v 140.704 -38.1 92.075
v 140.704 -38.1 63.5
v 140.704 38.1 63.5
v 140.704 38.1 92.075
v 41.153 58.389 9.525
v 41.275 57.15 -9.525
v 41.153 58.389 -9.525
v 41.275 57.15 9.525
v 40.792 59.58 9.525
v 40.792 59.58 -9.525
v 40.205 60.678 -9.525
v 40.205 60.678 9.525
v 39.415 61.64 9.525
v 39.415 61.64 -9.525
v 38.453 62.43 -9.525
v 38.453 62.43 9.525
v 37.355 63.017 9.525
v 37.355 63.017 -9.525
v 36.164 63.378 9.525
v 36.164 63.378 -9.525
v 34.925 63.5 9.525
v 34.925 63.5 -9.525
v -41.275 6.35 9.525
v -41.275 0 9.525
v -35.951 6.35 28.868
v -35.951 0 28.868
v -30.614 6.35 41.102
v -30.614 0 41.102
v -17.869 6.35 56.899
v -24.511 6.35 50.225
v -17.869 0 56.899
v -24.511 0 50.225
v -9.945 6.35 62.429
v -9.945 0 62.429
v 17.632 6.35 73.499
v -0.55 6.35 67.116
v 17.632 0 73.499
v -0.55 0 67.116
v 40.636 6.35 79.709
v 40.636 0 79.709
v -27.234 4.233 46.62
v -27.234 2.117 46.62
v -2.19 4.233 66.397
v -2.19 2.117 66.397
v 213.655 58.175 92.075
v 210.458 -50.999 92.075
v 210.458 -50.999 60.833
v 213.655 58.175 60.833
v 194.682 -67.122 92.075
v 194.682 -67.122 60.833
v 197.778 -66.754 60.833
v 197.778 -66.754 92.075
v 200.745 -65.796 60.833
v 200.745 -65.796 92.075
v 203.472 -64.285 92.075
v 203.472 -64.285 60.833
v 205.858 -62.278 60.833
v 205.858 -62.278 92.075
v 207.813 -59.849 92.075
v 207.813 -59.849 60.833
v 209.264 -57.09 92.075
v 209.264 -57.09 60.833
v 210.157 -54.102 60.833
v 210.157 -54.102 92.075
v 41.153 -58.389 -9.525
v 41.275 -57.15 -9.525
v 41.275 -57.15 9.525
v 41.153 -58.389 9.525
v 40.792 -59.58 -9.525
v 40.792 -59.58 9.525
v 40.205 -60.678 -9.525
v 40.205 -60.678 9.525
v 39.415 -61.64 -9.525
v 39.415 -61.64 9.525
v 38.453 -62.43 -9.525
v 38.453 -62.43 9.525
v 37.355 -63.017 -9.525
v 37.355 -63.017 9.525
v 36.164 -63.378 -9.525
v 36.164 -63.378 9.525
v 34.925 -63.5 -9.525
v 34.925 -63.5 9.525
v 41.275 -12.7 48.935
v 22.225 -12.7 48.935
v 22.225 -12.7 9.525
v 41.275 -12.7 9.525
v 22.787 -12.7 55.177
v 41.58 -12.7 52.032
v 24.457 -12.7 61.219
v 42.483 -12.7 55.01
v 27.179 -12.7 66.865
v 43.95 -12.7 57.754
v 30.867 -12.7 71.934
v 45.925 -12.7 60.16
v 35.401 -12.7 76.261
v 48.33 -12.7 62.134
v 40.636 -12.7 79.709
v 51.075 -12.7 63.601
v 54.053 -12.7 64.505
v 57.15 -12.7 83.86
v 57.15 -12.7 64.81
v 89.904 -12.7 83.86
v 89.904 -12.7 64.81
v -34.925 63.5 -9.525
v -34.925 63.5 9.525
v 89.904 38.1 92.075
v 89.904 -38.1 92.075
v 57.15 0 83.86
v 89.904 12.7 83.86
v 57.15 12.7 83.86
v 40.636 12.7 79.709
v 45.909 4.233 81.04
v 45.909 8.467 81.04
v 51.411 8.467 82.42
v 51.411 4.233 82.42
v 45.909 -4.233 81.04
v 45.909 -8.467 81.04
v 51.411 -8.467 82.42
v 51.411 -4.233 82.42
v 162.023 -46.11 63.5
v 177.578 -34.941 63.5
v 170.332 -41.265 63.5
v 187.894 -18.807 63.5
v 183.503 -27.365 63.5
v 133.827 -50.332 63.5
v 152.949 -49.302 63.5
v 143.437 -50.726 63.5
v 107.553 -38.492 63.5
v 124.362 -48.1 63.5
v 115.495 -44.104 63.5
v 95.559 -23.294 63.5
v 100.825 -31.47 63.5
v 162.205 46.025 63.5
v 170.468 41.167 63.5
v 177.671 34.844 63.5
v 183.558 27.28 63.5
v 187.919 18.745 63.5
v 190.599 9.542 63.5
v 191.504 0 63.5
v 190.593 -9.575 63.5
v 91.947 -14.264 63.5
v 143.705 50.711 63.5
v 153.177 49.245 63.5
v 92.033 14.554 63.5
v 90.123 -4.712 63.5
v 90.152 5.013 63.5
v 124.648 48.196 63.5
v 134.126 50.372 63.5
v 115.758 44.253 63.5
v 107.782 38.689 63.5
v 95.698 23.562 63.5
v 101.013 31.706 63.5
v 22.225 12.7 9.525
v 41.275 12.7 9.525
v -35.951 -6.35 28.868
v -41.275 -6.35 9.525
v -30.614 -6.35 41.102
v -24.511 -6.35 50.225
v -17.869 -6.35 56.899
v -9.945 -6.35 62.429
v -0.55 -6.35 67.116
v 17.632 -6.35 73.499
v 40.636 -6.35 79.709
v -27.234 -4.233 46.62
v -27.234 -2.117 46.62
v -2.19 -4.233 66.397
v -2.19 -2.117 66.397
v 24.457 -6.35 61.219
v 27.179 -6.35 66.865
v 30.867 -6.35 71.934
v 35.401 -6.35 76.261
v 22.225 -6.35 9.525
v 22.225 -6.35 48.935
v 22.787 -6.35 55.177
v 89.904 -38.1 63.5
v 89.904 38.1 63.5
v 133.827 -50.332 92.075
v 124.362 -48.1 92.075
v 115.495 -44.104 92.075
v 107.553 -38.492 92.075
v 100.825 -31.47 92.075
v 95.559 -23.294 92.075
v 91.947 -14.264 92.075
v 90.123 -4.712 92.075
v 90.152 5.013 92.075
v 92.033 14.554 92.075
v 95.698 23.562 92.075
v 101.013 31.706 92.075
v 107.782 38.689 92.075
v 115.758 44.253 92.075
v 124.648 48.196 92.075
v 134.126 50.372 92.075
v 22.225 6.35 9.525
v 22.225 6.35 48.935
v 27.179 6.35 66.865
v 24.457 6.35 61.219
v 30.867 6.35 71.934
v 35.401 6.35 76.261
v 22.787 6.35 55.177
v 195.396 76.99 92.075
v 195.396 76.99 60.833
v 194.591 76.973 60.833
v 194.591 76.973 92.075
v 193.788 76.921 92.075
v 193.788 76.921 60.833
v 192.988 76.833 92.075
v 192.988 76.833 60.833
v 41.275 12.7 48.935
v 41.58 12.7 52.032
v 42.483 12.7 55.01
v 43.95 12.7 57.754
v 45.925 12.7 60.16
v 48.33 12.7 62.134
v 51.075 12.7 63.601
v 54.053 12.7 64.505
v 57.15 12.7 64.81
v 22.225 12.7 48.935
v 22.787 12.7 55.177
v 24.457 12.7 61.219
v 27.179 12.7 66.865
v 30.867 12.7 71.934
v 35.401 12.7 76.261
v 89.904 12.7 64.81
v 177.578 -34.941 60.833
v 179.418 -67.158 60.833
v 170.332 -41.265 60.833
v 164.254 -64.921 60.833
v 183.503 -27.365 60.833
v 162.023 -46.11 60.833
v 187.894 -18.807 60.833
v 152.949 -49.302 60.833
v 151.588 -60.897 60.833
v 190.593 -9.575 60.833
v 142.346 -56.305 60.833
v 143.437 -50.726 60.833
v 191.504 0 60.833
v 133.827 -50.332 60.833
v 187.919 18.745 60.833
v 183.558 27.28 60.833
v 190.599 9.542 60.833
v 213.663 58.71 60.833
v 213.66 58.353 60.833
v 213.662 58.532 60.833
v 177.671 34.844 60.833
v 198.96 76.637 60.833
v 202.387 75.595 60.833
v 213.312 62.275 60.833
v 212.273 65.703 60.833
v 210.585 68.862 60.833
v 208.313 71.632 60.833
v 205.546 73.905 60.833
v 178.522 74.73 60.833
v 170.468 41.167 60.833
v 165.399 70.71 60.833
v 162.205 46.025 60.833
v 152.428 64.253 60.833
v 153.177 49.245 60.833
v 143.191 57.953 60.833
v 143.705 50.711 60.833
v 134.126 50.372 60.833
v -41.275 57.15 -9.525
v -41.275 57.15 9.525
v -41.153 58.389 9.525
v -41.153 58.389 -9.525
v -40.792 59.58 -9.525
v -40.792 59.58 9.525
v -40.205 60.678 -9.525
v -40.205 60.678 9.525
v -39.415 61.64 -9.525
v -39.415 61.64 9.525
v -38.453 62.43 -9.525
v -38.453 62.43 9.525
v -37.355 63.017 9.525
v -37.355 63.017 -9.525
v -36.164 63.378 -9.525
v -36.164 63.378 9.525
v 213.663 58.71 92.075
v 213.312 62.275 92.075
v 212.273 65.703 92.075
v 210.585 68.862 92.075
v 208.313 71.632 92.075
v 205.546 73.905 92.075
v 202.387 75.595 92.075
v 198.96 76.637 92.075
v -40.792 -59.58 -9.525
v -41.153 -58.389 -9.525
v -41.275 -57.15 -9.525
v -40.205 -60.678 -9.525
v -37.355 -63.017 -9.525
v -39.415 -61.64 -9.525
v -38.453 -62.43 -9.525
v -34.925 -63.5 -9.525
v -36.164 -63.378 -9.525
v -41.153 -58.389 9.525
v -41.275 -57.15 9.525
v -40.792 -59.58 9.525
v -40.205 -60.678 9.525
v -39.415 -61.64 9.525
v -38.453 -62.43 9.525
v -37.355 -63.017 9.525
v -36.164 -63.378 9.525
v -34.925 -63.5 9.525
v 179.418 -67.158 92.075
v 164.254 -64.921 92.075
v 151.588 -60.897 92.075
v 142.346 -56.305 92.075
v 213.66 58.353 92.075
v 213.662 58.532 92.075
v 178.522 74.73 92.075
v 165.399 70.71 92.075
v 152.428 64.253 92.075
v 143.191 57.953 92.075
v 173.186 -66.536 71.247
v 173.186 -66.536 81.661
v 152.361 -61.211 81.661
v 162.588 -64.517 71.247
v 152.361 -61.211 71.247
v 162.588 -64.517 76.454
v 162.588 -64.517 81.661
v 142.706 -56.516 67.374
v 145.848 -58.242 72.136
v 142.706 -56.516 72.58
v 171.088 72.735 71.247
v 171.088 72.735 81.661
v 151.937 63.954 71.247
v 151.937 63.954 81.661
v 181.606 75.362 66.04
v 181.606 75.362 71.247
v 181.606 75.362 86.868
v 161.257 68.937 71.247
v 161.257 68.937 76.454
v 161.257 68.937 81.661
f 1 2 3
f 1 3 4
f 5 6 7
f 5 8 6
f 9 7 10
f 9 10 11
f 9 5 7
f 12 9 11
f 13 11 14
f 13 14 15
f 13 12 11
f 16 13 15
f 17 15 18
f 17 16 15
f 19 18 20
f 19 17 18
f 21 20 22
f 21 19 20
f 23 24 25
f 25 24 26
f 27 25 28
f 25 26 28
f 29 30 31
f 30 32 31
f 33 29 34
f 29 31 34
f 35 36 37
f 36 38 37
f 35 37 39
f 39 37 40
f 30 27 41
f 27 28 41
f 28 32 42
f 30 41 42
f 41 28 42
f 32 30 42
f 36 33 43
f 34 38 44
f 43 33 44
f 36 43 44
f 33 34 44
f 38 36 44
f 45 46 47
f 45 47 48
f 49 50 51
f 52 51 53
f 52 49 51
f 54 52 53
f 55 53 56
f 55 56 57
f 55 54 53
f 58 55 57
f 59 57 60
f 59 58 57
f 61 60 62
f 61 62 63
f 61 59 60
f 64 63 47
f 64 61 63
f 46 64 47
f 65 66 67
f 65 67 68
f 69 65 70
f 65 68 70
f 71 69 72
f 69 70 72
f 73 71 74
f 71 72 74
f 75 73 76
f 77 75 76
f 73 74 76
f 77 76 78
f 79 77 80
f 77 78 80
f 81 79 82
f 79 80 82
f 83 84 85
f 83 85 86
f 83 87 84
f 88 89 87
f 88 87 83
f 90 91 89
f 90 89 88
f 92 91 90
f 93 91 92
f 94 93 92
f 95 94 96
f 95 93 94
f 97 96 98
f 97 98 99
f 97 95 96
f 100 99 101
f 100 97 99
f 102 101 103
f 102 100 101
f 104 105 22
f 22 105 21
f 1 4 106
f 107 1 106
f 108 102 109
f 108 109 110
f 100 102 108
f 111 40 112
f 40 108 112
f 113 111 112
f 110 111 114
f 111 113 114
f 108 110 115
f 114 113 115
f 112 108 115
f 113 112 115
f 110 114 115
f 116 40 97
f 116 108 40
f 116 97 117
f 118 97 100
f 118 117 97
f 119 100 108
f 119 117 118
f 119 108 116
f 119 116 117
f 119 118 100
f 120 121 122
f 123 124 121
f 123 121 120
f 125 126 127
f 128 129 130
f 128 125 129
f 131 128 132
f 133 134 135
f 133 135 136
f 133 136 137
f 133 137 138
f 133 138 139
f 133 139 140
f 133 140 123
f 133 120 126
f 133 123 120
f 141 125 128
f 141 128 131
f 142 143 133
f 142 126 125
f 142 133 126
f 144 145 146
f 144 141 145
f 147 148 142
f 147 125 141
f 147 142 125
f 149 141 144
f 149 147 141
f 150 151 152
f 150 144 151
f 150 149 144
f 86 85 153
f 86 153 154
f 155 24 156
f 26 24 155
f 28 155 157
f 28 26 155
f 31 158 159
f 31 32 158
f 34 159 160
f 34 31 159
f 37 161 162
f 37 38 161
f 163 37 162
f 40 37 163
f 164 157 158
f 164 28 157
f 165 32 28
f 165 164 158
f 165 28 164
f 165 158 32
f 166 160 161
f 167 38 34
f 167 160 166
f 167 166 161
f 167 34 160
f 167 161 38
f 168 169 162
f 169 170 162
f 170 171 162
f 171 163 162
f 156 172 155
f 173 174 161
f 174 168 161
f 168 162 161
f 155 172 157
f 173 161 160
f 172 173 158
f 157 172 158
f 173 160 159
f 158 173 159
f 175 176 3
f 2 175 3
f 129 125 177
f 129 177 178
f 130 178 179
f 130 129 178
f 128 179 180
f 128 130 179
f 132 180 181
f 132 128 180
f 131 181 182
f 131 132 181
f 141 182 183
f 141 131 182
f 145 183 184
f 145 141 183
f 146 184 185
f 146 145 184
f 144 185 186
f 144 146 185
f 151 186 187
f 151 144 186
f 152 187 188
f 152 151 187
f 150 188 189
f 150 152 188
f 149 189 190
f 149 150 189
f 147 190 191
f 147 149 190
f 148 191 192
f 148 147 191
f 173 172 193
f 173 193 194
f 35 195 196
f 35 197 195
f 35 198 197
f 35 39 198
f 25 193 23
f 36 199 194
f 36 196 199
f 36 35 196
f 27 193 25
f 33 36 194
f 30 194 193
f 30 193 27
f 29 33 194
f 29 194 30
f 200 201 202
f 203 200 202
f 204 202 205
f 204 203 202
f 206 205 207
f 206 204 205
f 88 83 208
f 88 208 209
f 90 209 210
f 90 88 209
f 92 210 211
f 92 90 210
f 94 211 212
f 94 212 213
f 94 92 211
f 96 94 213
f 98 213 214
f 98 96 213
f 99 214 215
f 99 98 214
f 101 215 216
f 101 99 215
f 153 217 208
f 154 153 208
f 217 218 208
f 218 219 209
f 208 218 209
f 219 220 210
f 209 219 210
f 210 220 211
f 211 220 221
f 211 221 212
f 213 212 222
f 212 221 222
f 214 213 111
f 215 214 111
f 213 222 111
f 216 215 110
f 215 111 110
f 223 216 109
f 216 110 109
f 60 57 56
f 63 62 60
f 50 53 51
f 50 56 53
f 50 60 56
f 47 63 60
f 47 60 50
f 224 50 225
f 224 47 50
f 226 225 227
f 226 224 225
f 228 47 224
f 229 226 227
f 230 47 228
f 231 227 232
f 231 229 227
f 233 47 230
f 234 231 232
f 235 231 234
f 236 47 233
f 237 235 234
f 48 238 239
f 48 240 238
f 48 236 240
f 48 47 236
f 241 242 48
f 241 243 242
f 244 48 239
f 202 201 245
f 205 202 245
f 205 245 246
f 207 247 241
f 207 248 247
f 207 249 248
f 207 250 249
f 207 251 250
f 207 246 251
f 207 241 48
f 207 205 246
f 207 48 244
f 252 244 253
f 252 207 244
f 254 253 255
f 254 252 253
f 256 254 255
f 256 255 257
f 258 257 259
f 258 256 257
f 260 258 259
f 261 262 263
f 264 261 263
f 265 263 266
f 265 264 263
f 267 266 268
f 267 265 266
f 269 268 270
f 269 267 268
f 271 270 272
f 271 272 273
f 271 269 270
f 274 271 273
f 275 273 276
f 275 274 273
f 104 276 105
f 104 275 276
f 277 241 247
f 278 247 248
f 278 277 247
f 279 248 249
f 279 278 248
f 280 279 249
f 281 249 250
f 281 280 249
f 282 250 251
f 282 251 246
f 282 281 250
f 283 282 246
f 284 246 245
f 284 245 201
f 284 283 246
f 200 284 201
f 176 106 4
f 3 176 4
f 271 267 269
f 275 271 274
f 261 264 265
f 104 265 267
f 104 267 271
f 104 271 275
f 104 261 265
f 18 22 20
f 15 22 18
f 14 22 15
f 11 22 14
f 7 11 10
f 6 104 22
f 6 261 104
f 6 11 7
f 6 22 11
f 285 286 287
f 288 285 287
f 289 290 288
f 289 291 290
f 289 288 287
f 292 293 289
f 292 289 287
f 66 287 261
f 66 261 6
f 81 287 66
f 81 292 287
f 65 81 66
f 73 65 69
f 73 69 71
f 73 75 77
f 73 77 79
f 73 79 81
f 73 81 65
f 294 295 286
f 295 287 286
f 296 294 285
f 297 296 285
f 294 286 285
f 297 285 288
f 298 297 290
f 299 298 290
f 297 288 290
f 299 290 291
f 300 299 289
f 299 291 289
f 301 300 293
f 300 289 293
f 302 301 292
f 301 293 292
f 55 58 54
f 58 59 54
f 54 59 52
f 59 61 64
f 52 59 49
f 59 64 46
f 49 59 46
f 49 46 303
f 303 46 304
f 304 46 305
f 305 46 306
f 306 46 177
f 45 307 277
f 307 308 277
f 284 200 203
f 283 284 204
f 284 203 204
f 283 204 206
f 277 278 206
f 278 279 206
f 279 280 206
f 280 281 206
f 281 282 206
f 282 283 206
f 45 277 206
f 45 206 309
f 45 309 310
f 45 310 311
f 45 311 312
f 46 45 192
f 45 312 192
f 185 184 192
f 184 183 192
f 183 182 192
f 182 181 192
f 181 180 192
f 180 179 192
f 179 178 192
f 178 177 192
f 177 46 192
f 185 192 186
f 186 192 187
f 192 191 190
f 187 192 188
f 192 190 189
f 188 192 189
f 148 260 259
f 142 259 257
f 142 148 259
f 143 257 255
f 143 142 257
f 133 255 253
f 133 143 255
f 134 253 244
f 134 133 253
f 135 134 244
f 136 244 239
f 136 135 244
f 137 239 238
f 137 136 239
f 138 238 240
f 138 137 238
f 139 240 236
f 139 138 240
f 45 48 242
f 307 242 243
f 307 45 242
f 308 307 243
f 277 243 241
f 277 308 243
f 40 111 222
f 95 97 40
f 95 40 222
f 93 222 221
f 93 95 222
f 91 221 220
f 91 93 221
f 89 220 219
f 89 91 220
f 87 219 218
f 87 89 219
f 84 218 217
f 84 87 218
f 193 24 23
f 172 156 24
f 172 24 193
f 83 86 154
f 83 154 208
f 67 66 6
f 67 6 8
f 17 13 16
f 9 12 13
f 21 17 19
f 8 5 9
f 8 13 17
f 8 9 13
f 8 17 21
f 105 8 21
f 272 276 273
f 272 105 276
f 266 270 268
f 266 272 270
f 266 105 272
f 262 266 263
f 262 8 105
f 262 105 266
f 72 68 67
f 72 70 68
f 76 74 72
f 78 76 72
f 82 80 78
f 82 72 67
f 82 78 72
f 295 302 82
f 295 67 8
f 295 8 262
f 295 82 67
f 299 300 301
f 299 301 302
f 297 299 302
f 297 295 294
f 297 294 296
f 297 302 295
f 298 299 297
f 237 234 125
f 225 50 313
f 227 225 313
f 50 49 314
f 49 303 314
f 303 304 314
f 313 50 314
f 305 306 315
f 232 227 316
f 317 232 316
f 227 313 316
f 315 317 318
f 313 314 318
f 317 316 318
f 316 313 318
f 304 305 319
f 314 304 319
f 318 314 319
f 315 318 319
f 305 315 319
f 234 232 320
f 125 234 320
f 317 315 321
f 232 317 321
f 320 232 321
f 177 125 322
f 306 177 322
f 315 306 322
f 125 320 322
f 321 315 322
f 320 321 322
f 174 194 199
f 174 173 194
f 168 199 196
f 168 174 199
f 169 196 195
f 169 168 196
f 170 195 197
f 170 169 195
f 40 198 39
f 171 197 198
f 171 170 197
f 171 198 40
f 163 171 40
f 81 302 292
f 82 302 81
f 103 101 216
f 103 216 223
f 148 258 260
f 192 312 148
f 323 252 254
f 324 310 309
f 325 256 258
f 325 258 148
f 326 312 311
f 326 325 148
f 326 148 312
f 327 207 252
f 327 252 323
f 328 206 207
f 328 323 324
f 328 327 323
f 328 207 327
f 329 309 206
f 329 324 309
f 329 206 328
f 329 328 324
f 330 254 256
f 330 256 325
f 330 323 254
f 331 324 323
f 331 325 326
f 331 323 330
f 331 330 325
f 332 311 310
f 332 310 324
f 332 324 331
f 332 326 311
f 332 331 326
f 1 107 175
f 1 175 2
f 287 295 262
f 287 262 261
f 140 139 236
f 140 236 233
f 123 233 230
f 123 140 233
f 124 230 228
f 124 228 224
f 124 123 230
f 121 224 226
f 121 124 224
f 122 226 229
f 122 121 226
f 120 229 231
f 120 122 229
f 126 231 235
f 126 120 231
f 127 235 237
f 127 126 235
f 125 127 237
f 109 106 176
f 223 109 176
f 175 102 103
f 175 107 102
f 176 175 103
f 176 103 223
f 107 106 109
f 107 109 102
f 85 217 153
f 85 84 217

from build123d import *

# Parameters (mm, degrees)
F1_DEPTH = 63.5
F2_DEPTH = 12.7
F3_DEPTH = 38.1
F4_DEPTH = 6.35
F7_DEPTH = 31.242
F8_R     = 6.35


with BuildPart() as f1:
    # F0 (on Front) → F1 (new body, symmetric)
    with BuildSketch(Plane.XZ):
        Polygon((22.225, 9.525), (-41.275, 9.525), (-41.275, -9.525), (41.275, -9.525), (41.275, 9.525), align=None)
    extrude(amount=F1_DEPTH, both=True)

    # F8
    f8_edges = [f1.edges().sort_by_distance(p)[0] for p in [
        (-41.275, -63.5, 0),
        (-41.275, 63.5, 0),
        (41.275, 63.5, 0),
        (41.275, -63.5, 0),
    ]]
    fillet(f8_edges, radius=F8_R)


with BuildPart() as f2:
    # F0 (on Front) → F2 (new body, symmetric)
    with BuildSketch(Plane.XZ):
        with BuildLine():
            Line((22.225, 48.9346176877), (22.225, 9.525))
            Line((22.225, 9.525), (41.275, 9.525))
            Line((41.275, 9.525), (41.275, 48.9346176877))
            ThreePointArc((41.275, 48.9346176877), (45.9246798487, 60.159937839), (57.15, 64.8096176877))
            Line((57.15, 64.8096176877), (89.9035876796, 64.8096176877))
            Line((89.9035876796, 64.8096176877), (89.9035876796, 83.8596176877))
            Line((89.9035876796, 83.8596176877), (57.15, 83.8596176877))
            add(Edge.make_bspline(
                [(40.6362728198, 79.708834812), (45.7953878663, 81.0180571724), (51.2910836418, 82.3874351117), (57.15, 83.8596176877)],
                knots=[112.5810740655, 112.5810740655, 112.5810740655, 112.5810740655, 123.3414610412, 123.3414610412, 123.3414610412, 123.3414610412], degree=3))
            ThreePointArc((40.6362728198, 79.708834812), (27.1792013222, 66.8652298249), (22.225, 48.9346176877))
        make_face()
    extrude(amount=F2_DEPTH, both=True)

    # F0 (on Front) → F3 (join, symmetric)
    with BuildSketch(Plane.XZ):
        Polygon((89.9035876796, 92.075), (89.9035876796, 83.8596176877), (89.9035876796, 64.8096176877), (89.9035876796, 63.5), (140.7035876796, 63.5), (140.7035876796, 92.075), align=None)
    extrude(amount=F3_DEPTH, both=True)


with BuildPart() as f4:
    # F0 (on Front) → F4 (new body, symmetric)
    with BuildSketch(Plane.XZ):
        with BuildLine():
            add(Edge.make_bspline(
                [(-41.275, 9.525), (-30.4749280826, 58.8981551906), (-13.3412202281, 66.0110319487), (40.6362728198, 79.708834812)],
                knots=[0, 0, 0, 0, 112.5810740655, 112.5810740655, 112.5810740655, 112.5810740655], degree=3))
            Line((-41.275, 9.525), (22.225, 9.525))
            Line((22.225, 9.525), (22.225, 48.9346176877))
            ThreePointArc((22.225, 48.9346176877), (27.1792013222, 66.8652298249), (40.6362728198, 79.708834812))
        make_face()
    extrude(amount=F4_DEPTH, both=True)


with BuildPart() as f5:
    # F0 (on Front) → F5 (revolve)
    with BuildSketch(Plane.XZ):
        Polygon((89.9035876796, 92.075), (89.9035876796, 83.8596176877), (89.9035876796, 64.8096176877), (89.9035876796, 63.5), (140.7035876796, 63.5), (140.7035876796, 92.075), align=None)
    revolve(axis=Axis((140.7035876796, 0, 77.7875), (0, 0, -1)))

    # F6 (on face) → F7 (join)
    with BuildSketch(Plane.XY.offset(92.075)):
        with BuildLine():
            add(Edge.make_bspline(
                [(195.3957488993, 76.9903316021), (194.5858476043, 76.9454691333), (193.7831848728, 76.8929408928), (192.9875223741, 76.8327266294)],
                knots=[0, 0, 0, 0, 2.1660508841, 2.1660508841, 2.1660508841, 2.1660508841], degree=3))
            ThreePointArc((195.3957488993, 76.9903316021), (194.1890319004, 76.951314578), (192.9875223741, 76.8327266294))
        make_face()
        with BuildLine():
            Line((210.4584741588, -50.998903811), (213.6552396794, 58.1750413675))
            ThreePointArc((213.6552396794, 58.1750413675), (183.1334072241, 45.141016919), (192.9875223741, 76.8327266294))
            add(Edge.make_bspline(
                [(192.9875223741, 76.8327266294), (169.2447813082, 75.0359199858), (151.7353170053, 66.3951826409), (134.1264691023, 50.3724280854)],
                knots=[2.1660508841, 2.1660508841, 2.1660508841, 2.1660508841, 66.8014777865, 66.8014777865, 66.8014777865, 66.8014777865], degree=3))
            ThreePointArc((134.1264691023, 50.3724280854), (174.2186766417, 38.175631126), (191.5035876796, 0))
            ThreePointArc((191.5035876796, 0), (174.1050238816, -38.2751101846), (133.8270498984, -50.332427203))
            add(Edge.make_bspline(
                [(194.6815417818, -67.1222711654), (173.3915358782, -68.63476336), (150.6744772196, -64.2580837011), (133.8270498984, -50.332427203)],
                knots=[0, 0, 0, 0, 63.1281873862, 63.1281873862, 63.1281873862, 63.1281873862], degree=3))
            ThreePointArc((194.6815417818, -67.1222711654), (182.8045083954, -39.7197796199), (210.4584741588, -50.998903811))
        make_face()
        with BuildLine():
            ThreePointArc((213.6552396794, 58.1750413675), (213.661113357, 58.4425337087), (213.6630713893, 58.7100833654))
            ThreePointArc((213.6630713893, 58.7100833654), (208.3134800534, 71.6316017219), (195.3957488993, 76.9903316021))
            add(Edge.make_bspline(
                [(195.3957488993, 76.9903316021), (194.5858476043, 76.9454691333), (193.7831848728, 76.8929408928), (192.9875223741, 76.8327266294)],
                knots=[0, 0, 0, 0, 2.1660508841, 2.1660508841, 2.1660508841, 2.1660508841], degree=3))
            ThreePointArc((192.9875223741, 76.8327266294), (183.1334072241, 45.141016919), (213.6552396794, 58.1750413675))
        make_face()
        with BuildLine():
            ThreePointArc((194.6815417818, -67.1222711654), (205.8580980823, -62.2780280021), (210.4584741588, -50.998903811))
            ThreePointArc((210.4584741588, -50.998903811), (182.8045083954, -39.7197796199), (194.6815417818, -67.1222711654))
        make_face()
    extrude(amount=-F7_DEPTH)


solid = Compound([f1.part, f2.part, f4.part, f5.part])
